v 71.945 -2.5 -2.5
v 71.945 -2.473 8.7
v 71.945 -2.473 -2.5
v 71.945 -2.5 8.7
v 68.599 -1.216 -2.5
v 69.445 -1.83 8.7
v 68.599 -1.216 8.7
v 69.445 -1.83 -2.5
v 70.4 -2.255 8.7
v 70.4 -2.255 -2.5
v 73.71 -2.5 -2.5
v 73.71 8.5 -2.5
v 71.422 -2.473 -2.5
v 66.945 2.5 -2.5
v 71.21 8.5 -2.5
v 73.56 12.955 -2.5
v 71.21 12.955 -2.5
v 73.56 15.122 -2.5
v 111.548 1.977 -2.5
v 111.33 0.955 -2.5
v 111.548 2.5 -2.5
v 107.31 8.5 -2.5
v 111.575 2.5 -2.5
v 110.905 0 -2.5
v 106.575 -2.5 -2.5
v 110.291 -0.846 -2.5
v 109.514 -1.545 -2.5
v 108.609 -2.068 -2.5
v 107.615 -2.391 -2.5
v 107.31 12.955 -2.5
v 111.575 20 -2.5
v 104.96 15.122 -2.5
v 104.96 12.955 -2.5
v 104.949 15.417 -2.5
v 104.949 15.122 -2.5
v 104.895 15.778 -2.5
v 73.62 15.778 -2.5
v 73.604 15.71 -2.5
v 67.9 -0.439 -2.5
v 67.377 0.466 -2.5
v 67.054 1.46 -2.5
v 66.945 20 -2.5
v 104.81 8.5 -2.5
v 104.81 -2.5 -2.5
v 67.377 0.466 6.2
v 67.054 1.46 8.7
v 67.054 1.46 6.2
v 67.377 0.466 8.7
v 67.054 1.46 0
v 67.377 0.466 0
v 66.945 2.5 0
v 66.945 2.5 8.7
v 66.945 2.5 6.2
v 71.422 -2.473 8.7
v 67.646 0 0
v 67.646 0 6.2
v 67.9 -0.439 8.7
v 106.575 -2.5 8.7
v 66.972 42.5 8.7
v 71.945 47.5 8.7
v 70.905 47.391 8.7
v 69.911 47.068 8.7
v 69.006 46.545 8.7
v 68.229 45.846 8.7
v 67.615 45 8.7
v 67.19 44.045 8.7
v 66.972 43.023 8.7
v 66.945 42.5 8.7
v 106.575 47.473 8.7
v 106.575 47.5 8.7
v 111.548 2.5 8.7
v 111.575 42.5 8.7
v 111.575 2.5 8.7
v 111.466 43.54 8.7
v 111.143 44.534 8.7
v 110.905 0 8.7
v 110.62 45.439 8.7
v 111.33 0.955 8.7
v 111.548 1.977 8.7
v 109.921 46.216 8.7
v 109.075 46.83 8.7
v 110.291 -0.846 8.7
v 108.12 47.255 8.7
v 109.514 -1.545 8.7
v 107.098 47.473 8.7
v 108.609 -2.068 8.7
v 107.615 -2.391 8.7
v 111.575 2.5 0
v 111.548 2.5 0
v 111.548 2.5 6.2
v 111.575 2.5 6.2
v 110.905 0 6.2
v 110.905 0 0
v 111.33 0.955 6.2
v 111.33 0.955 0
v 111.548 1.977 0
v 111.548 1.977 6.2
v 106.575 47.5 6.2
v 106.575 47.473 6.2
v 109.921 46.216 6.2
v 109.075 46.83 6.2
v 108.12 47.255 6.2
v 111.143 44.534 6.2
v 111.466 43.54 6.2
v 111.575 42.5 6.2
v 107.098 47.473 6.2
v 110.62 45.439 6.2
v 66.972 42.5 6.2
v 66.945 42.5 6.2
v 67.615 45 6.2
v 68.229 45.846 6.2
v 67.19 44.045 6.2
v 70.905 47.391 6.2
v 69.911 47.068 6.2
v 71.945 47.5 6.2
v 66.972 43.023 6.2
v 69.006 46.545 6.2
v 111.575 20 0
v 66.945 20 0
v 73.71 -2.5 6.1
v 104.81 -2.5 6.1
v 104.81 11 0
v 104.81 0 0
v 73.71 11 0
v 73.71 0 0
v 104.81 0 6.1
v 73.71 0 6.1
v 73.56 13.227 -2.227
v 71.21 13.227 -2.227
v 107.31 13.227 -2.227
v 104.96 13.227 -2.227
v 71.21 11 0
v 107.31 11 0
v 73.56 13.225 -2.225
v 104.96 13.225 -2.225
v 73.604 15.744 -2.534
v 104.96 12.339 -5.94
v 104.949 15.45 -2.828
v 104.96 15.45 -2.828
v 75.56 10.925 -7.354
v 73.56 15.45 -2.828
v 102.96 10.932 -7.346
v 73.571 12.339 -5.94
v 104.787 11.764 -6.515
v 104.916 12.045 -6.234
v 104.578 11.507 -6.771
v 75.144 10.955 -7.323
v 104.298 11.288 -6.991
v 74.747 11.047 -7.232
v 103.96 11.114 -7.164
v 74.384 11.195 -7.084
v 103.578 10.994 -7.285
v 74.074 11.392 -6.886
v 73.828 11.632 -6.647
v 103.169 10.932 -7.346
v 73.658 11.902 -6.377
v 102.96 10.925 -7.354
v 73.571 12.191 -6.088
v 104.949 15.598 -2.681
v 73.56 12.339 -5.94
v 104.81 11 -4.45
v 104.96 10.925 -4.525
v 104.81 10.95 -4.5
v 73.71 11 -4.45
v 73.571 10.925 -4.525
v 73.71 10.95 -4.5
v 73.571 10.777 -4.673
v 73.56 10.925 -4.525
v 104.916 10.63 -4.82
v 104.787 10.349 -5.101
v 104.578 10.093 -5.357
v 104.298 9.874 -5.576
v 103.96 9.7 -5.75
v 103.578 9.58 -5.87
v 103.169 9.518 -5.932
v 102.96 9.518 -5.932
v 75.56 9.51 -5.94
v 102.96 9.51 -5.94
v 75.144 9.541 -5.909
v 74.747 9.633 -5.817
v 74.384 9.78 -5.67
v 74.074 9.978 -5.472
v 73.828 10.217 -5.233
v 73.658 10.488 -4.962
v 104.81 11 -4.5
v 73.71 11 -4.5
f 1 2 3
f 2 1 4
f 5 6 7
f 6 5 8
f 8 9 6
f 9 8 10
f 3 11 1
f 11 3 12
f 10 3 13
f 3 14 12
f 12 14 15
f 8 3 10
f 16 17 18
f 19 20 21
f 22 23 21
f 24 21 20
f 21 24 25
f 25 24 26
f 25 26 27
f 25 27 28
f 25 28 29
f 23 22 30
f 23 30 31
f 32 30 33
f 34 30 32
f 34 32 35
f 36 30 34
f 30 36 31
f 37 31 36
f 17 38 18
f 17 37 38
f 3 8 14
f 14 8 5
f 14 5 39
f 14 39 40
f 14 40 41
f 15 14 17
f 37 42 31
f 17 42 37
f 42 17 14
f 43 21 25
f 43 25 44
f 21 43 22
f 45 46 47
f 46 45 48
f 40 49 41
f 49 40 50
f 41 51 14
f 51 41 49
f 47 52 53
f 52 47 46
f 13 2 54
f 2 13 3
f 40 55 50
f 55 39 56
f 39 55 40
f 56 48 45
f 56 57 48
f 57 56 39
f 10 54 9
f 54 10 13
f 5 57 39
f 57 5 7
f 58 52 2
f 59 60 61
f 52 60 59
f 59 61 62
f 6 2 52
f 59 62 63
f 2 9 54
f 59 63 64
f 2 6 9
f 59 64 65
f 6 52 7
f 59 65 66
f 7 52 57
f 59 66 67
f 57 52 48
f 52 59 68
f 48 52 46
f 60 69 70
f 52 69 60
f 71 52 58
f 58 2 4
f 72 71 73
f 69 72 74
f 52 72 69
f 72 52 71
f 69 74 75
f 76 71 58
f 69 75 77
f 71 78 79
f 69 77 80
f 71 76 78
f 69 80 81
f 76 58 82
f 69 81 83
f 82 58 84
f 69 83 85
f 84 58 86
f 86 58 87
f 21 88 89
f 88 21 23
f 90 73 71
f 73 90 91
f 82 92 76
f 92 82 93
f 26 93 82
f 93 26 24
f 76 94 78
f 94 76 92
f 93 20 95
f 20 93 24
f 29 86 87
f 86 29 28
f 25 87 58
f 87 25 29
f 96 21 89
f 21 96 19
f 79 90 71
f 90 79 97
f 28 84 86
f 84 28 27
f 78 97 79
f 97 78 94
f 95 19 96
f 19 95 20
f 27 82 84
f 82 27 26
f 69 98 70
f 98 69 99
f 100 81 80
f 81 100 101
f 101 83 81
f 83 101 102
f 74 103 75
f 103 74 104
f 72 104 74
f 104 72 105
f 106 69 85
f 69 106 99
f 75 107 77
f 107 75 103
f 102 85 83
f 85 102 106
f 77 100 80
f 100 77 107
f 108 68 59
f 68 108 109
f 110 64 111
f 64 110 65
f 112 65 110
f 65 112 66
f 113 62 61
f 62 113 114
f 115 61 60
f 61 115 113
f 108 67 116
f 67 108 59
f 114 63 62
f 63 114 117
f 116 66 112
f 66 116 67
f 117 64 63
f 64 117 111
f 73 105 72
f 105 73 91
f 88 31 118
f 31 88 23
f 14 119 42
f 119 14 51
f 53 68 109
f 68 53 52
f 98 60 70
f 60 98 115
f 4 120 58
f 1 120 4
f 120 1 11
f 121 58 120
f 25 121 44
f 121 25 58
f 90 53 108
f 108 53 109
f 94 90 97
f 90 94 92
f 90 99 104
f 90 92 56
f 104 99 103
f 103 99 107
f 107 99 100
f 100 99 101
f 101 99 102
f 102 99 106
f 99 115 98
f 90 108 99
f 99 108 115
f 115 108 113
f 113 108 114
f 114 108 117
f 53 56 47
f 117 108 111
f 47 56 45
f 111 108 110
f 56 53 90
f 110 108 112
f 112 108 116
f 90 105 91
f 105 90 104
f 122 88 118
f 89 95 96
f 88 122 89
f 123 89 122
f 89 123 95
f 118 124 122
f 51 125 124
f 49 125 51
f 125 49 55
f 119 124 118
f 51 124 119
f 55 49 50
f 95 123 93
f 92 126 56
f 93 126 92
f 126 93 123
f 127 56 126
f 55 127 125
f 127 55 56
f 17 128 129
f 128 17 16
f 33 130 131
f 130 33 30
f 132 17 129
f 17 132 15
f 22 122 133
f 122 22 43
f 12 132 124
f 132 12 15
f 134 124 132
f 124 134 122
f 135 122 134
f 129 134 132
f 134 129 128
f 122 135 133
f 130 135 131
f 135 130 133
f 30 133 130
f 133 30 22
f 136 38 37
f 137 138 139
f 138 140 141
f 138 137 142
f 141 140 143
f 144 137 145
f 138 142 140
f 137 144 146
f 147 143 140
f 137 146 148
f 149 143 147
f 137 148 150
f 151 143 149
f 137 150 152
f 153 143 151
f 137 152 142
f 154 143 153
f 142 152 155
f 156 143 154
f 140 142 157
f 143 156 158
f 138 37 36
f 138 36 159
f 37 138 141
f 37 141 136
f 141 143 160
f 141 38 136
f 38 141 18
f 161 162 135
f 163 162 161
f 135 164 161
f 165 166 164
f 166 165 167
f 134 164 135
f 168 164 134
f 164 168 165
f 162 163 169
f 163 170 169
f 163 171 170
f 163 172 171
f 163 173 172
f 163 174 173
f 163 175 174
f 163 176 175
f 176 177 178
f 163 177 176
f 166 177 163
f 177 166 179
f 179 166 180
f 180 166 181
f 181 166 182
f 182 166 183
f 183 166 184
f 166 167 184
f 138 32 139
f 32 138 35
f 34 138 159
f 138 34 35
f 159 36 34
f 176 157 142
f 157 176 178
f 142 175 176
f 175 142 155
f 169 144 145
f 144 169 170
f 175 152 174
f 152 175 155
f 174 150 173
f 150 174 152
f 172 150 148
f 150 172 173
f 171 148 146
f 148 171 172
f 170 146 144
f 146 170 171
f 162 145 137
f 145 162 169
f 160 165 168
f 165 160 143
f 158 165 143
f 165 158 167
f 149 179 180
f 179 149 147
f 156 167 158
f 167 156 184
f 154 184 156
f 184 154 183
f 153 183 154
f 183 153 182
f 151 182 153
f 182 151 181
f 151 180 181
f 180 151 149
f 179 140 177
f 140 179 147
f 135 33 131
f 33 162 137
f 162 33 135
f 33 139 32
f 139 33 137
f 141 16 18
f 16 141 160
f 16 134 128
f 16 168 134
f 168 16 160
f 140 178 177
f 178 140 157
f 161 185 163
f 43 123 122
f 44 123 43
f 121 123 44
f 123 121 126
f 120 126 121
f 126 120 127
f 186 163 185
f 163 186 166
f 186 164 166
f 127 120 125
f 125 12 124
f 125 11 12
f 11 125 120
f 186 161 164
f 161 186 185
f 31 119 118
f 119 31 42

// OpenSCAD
// Set to 0.01 for higher definition curves (renders slower)
$fs = 0.1;

module roundedsquare(xx, yy, radius) {

difference(){

    square([xx,yy]);

    difference(){
        translate([-.5,-.5,-.2])
        square([radius+.5,radius+.5]);

        translate([radius,radius,height/2])
        cylinder(height,radius,radius,true);
    }
    translate([xx,0,0])
    rotate(90)
    difference(){
        translate([-.5,-.5,-.2])
        square([radius+.5,radius+.5]);

        translate([radius,radius,height/2])
        cylinder(height,radius,radius,true);
    }

    translate([xx,yy,0])
    rotate(180)
    difference(){
        translate([-.5,-.5,-.2])
        square([radius+.5,radius+.5]);

        translate([radius,radius,height/2])
        cylinder(height,radius,radius,true);
    }

    translate([0,yy,0])
    rotate(270)
    difference(){
        translate([-.5,-.5,-.2])
        square([radius+.5,radius+.5]);

        translate([radius,radius,height/2])
        cylinder(height,radius,radius,true);
    }
}
}

module roundedcube2(xx, yy, height, radius) {

difference(){

    cube([xx,yy,height]);

    difference(){
        translate([-.5,-.5,-.2])
        cube([radius+.5,radius+.5,height+.5]);

        translate([radius,radius,height/2])
        cylinder(height,radius,radius,true);
    }
    translate([xx,0,0])
    rotate(90)
    difference(){
        translate([-.5,-.5,-.2])
        cube([radius+.5,radius+.5,height+.5]);

        translate([radius,radius,height/2])
        cylinder(height,radius,radius,true);
    }

    translate([xx,yy,0])
    rotate(180)
    difference(){
        translate([-.5,-.5,-.2])
        cube([radius+.5,radius+.5,height+.5]);

        translate([radius,radius,height/2])
        cylinder(height,radius,radius,true);
    }

    translate([0,yy,0])
    rotate(270)
    difference(){
        translate([-.5,-.5,-.2])
        cube([radius+.5,radius+.5,height+.5]);

        translate([radius,radius,height/2])
        cylinder(height,radius,radius,true);
    }
}
}


module phone(phone_width, phone_length, phone_thickness, phone_edge_radius, camera_bump_x_offset, camera_bump_y_offset, camera_bump_width, camera_bump_length, camera_bump_thickness, camera_bump_radius) {
    sphere_size = 0.001;
    
    //minowski adds spheres around parts, so we need to translate by sphere_size
    //translate([sphere_size, sphere_size, sphere_size]) {
       // minkowski() {
           //minowski adds spheres around parts, so we need remove sphere size from width, length, and thickness
           roundedcube2(phone_width, phone_length, phone_thickness, phone_edge_radius);
           //sphere(r=sphere_size,$fn=50);
         //}
     //}

    //translate([phone_width-camera_bump_x_offset-camera_bump_width/2, camera_bump_y_offset-camera_bump_y_offset/2, phone_thickness-0.1]) {
    translate([phone_width-camera_bump_width/2-camera_bump_x_offset, camera_bump_y_offset-camera_bump_length/2, phone_thickness-0.1]) {
        roundedcube2(camera_bump_width, camera_bump_length, camera_bump_thickness+0.1, camera_bump_radius);
    }
}

module mirror(size = [1,1,1], angle = 225) {
    rotate(a=angle, v=[1,0,0]){
        cube(size);
    }
}

module mirror_round(l,w,h, angle = 225, radius = 5) {
    rotate(a=angle, v=[1,0,0]){
        roundedcube2(l,w,h,radius);
    }
}


// all units in mm and degress

//offsets
phone_thickness_offset = 0.3;
camera_bump_offset = 0.1;

// iPad Pro small dimensions
phone_width = 178.52; //from spec
phone_length = 247.64; //from spec
phone_thickness = 5.9+phone_thickness_offset; //from spec
phone_edge_radius = 8; // guess
camera_bump_x_offset = 11.82-camera_bump_offset; //from spec with offset
camera_bump_y_offset = 18.67-camera_bump_offset; //from spec with offset
camera_bump_width = 11.26+camera_bump_offset*2; //from spec with offset
camera_bump_length = 24.53+camera_bump_offset*2; //from spec with offset
camera_bump_thickness = 1.56+1;  //spec 1.56
camera_bump_radius = camera_bump_width/2; //Xr specific, make it round
notch_height = 8.7; //ipad's bezel is 8.7. this is a definite guess

// DFM experimental offsets
dfm_mirror_width= 0.7;
dfm_mirror_thickness=0.15;
dfm_notch_offset=2.3;

// mirror
mirror_height = 25.4; //from spec
mirror_width = 35.4 + dfm_mirror_width; //from spec -- 36.1 in file?
mirror_thickness = 3 + dfm_mirror_thickness; //from spec --

// mirror back
mirror_back_height = 8.4;
mirror_back_width = 35.4-4;
mirror_back_thickness = 2;

// clip
clip_width = phone_width*0.25;
clip_length = 50;
clip_top_bottom_thickness = 2.5;
clip_thickness = phone_thickness+(clip_top_bottom_thickness*2);

// clip cutout
cutout_width = mirror_width-5;
cutout_length = 16;
cutout_thickness = clip_thickness/2+5; //2 is just for some clearance

notch_offset_height = notch_height+dfm_notch_offset; //notch height from spec, add more?
notch_offset_width = phone_width/2-mirror_width/2;
back_offset_width = phone_width/2-mirror_back_width/2;

//trim up top length
difference() {
  //cutout from slot
    difference() {
      //clip with back
      union() {
        //resulting clip
        difference() {
          //clip cube
          translate([phone_width/2-clip_width/2, -clip_top_bottom_thickness, -clip_top_bottom_thickness]) color("red") roundedcube2(clip_width, clip_length, clip_thickness, 5);
          //phone and mirror back
          union() {
            //phone
            phone(phone_width, phone_length, phone_thickness, phone_edge_radius, camera_bump_x_offset, camera_bump_y_offset, camera_bump_width, camera_bump_length, camera_bump_thickness, camera_bump_radius);

            //mirror slot
            translate([notch_offset_width,notch_offset_height,0]) {
              mirror([mirror_width, mirror_height, mirror_thickness]);
            }
          }
        }

        //mirror back 4.1 is a magic number :/
        translate([back_offset_width, notch_offset_height+4.45, 0]) {
          color("blue") mirror_round(mirror_back_width, mirror_back_height, mirror_back_thickness, 225, 2);
        }
    }
    // cutout - with some magic numbers
    translate([phone_width/2-cutout_width/2,-5,-clip_top_bottom_thickness-2]) color("green") cube([cutout_width,cutout_length,cutout_thickness]);
  }
  // front trim cube
  translate([-10,20,-phone_thickness]) cube([phone_width+20,phone_length+20,10]);
}
